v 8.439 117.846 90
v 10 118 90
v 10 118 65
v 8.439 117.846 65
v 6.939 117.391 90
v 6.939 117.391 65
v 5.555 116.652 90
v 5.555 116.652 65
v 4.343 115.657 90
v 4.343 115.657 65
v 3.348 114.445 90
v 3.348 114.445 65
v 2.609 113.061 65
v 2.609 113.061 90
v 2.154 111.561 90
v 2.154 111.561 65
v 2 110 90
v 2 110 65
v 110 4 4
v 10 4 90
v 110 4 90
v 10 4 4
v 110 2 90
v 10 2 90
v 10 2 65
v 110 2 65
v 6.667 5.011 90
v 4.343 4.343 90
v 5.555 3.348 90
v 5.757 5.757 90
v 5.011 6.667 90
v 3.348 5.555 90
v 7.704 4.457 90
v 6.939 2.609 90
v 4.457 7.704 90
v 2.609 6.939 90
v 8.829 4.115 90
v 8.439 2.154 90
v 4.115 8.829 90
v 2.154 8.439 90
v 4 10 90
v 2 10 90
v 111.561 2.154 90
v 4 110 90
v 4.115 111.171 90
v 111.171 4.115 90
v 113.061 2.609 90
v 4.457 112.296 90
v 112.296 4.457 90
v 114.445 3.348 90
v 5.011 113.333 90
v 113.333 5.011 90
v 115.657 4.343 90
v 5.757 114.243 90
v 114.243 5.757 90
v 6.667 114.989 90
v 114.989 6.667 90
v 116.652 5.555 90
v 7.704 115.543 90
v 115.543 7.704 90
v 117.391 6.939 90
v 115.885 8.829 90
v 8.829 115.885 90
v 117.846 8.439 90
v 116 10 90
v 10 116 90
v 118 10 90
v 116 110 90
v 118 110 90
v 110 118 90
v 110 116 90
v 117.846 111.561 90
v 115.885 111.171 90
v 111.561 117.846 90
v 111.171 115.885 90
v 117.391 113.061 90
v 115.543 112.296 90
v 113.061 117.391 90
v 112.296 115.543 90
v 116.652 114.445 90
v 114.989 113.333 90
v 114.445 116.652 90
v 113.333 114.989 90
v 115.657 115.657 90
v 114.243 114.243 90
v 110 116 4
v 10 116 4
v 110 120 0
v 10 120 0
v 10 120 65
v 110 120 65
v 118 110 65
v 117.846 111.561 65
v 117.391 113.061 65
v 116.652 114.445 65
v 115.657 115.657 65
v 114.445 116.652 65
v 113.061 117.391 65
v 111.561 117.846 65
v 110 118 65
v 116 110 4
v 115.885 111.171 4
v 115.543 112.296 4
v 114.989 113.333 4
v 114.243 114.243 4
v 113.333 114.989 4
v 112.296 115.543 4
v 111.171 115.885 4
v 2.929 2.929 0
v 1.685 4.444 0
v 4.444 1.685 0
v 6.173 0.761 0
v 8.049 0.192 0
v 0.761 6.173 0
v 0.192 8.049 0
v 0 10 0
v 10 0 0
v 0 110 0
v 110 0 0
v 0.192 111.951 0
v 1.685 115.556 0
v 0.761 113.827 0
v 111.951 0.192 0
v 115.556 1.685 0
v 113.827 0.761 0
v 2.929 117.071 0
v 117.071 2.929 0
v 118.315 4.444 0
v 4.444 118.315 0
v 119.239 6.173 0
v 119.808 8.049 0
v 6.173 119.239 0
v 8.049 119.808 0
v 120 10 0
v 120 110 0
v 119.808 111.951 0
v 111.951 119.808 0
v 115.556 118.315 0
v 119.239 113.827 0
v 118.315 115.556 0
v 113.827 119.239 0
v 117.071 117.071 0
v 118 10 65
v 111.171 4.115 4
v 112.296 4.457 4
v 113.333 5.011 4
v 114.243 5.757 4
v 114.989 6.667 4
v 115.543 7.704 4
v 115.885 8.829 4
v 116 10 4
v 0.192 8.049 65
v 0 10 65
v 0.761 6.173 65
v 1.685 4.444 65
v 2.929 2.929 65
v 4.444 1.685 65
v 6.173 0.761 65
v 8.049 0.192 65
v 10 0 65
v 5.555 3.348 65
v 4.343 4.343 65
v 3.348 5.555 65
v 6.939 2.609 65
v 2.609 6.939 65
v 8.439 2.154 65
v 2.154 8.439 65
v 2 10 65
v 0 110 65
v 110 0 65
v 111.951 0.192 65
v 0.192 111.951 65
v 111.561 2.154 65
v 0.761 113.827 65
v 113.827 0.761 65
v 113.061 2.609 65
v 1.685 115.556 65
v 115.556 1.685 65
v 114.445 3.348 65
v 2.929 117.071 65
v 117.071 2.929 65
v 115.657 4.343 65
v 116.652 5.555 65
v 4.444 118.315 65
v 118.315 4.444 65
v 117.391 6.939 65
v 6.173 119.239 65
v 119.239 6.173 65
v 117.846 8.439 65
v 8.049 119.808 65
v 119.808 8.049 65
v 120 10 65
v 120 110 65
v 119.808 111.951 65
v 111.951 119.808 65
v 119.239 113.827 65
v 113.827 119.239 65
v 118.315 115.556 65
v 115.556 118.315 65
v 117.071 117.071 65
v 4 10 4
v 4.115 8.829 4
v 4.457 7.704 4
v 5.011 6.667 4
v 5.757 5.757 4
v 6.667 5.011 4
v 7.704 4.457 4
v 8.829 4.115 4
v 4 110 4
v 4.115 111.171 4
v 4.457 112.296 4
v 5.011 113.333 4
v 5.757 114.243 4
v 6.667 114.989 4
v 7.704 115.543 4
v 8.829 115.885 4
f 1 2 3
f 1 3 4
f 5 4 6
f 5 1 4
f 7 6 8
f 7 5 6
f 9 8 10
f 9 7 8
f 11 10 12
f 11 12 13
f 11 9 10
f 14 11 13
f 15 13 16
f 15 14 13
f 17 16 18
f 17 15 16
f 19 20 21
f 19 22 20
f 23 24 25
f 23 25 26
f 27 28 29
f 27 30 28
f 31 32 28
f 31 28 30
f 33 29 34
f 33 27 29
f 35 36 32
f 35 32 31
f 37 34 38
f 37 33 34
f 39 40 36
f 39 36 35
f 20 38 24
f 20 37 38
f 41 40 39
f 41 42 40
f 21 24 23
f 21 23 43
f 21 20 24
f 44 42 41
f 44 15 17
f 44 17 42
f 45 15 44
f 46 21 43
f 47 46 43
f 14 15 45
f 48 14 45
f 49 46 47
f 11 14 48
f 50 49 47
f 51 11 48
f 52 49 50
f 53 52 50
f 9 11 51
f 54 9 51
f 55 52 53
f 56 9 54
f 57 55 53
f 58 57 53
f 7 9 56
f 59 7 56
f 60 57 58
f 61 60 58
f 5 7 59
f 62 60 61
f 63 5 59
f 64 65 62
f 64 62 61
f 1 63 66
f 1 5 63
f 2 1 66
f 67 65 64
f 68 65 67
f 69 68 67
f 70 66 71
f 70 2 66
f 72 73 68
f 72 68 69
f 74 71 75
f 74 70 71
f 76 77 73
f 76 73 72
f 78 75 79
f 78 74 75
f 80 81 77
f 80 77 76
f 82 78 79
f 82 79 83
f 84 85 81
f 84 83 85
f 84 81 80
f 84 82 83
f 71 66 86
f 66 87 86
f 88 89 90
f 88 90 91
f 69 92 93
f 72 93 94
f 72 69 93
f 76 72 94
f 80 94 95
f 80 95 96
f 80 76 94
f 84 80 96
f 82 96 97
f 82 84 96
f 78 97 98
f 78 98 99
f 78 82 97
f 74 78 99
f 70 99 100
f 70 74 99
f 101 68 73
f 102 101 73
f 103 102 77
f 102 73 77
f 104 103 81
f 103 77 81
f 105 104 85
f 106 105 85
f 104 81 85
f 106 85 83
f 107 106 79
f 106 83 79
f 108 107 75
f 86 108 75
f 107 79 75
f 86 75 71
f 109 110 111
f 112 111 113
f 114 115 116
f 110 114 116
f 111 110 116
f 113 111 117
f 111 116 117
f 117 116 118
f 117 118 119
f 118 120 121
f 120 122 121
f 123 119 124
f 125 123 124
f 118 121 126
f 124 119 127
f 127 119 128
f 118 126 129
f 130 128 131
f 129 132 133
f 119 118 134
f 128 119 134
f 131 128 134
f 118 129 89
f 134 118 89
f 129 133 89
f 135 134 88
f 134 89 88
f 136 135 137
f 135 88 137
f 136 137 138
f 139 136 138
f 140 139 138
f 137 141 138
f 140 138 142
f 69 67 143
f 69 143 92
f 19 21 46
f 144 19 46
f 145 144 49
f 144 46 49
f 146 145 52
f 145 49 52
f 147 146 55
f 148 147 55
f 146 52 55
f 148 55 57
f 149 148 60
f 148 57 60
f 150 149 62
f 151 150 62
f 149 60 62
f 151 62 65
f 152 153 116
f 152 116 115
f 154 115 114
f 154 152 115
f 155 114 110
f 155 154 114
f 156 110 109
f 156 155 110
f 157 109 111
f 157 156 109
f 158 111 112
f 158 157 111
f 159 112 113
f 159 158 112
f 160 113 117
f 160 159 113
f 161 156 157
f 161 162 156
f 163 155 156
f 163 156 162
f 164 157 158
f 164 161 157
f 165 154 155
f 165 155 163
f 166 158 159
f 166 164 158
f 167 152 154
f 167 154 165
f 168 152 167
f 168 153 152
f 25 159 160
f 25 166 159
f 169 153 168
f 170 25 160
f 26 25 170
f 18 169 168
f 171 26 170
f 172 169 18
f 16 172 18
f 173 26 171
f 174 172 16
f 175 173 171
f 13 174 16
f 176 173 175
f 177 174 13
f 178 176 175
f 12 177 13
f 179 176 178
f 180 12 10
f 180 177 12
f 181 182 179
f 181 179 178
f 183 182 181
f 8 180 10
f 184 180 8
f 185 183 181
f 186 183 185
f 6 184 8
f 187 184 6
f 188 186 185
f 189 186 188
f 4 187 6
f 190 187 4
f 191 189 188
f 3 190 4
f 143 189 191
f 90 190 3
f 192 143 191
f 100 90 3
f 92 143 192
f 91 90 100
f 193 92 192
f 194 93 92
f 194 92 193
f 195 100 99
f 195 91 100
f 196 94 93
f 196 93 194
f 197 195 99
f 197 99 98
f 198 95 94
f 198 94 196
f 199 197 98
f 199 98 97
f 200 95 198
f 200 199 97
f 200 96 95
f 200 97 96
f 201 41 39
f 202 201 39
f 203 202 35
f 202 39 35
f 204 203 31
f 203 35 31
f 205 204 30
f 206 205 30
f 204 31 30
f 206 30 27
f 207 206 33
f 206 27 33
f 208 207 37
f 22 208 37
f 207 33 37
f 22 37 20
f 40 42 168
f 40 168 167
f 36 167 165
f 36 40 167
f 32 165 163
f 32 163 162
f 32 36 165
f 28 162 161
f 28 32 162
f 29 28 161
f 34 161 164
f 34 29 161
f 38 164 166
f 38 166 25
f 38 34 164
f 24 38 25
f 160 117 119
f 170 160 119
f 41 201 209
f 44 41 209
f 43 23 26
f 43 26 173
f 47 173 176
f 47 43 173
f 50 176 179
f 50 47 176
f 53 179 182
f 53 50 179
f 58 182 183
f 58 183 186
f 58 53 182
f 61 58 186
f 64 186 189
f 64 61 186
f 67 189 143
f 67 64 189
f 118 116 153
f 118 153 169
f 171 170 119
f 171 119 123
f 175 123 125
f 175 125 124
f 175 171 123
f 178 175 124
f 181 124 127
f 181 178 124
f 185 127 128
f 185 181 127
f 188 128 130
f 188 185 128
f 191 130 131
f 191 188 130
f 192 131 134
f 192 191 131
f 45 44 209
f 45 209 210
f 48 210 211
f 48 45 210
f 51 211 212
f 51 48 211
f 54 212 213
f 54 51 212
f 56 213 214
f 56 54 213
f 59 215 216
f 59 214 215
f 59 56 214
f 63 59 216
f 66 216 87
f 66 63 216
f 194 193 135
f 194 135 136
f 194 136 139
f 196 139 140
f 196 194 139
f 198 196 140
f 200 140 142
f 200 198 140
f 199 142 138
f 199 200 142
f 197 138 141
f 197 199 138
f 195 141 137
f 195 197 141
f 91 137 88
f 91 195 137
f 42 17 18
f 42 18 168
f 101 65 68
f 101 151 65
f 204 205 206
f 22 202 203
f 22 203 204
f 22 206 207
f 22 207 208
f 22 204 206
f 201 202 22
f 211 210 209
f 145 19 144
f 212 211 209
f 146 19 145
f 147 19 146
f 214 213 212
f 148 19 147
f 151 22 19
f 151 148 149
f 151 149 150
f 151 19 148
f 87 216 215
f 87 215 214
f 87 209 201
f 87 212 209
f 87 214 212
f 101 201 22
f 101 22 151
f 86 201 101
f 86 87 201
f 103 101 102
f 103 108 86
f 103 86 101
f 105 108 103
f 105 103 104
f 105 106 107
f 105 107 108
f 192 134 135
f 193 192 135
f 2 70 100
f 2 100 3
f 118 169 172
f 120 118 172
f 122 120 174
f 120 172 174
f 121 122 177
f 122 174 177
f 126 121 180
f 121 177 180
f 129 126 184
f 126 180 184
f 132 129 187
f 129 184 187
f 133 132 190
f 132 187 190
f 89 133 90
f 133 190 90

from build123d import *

# Parameters (mm, degrees)
CROQUIS1_W              = 120
CROQUIS1_H              = 120
SALIENTE_EXTRUIR1_DEPTH = 90
REDONDEO2_R             = 10
VACIADO1_T              = -4
CROQUIS6_OUTSIDE_W      = 160.418
CROQUIS6_OUTSIDE_H      = 160.418
CORTAR_EXTRUIR2_DEPTH   = 25


with BuildPart() as part:
    # Croquis1 → Saliente-Extruir1 (new body)
    with BuildSketch(Plane.XY):
        with Locations((60, 60)):
            Rectangle(CROQUIS1_W, CROQUIS1_H)
    extrude(amount=SALIENTE_EXTRUIR1_DEPTH)

    # Redondeo2
    redondeo2_edges = [part.edges().sort_by_distance(p)[0] for p in [
        (0, 120, 45),
        (120, 120, 45),
        (120, 0, 45),
        (0, 0, 45),
    ]]
    fillet(redondeo2_edges, radius=REDONDEO2_R)

    # Vaciado1
    vaciado1_openings = [part.faces().sort_by_distance(p)[0] for p in [
        (60, 60, 90),
    ]]
    offset(amount=VACIADO1_T, openings=vaciado1_openings, kind=Kind.INTERSECTION)

    # Croquis6 outside → Cortar-Extruir2 (cut)
    with BuildSketch(Plane.XY.offset(90)):
        with Locations((60, 60)):
            Rectangle(CROQUIS6_OUTSIDE_W, CROQUIS6_OUTSIDE_H)
        with BuildLine():
            Line((10, 2), (110, 2))
            ThreePointArc((110, 2), (115.656854249, 4.343145751), (118, 10))
            Line((118, 10), (118, 110))
            ThreePointArc((118, 110), (115.656854249, 115.656854249), (110, 118))
            Line((110, 118), (10, 118))
            ThreePointArc((10, 118), (4.343145751, 115.656854249), (2, 110))
            Line((2, 110), (2, 10))
            ThreePointArc((2, 10), (4.343145751, 4.343145751), (10, 2))
        make_face(mode=Mode.SUBTRACT)
    extrude(amount=-CORTAR_EXTRUIR2_DEPTH, mode=Mode.SUBTRACT)


solid = part.part
